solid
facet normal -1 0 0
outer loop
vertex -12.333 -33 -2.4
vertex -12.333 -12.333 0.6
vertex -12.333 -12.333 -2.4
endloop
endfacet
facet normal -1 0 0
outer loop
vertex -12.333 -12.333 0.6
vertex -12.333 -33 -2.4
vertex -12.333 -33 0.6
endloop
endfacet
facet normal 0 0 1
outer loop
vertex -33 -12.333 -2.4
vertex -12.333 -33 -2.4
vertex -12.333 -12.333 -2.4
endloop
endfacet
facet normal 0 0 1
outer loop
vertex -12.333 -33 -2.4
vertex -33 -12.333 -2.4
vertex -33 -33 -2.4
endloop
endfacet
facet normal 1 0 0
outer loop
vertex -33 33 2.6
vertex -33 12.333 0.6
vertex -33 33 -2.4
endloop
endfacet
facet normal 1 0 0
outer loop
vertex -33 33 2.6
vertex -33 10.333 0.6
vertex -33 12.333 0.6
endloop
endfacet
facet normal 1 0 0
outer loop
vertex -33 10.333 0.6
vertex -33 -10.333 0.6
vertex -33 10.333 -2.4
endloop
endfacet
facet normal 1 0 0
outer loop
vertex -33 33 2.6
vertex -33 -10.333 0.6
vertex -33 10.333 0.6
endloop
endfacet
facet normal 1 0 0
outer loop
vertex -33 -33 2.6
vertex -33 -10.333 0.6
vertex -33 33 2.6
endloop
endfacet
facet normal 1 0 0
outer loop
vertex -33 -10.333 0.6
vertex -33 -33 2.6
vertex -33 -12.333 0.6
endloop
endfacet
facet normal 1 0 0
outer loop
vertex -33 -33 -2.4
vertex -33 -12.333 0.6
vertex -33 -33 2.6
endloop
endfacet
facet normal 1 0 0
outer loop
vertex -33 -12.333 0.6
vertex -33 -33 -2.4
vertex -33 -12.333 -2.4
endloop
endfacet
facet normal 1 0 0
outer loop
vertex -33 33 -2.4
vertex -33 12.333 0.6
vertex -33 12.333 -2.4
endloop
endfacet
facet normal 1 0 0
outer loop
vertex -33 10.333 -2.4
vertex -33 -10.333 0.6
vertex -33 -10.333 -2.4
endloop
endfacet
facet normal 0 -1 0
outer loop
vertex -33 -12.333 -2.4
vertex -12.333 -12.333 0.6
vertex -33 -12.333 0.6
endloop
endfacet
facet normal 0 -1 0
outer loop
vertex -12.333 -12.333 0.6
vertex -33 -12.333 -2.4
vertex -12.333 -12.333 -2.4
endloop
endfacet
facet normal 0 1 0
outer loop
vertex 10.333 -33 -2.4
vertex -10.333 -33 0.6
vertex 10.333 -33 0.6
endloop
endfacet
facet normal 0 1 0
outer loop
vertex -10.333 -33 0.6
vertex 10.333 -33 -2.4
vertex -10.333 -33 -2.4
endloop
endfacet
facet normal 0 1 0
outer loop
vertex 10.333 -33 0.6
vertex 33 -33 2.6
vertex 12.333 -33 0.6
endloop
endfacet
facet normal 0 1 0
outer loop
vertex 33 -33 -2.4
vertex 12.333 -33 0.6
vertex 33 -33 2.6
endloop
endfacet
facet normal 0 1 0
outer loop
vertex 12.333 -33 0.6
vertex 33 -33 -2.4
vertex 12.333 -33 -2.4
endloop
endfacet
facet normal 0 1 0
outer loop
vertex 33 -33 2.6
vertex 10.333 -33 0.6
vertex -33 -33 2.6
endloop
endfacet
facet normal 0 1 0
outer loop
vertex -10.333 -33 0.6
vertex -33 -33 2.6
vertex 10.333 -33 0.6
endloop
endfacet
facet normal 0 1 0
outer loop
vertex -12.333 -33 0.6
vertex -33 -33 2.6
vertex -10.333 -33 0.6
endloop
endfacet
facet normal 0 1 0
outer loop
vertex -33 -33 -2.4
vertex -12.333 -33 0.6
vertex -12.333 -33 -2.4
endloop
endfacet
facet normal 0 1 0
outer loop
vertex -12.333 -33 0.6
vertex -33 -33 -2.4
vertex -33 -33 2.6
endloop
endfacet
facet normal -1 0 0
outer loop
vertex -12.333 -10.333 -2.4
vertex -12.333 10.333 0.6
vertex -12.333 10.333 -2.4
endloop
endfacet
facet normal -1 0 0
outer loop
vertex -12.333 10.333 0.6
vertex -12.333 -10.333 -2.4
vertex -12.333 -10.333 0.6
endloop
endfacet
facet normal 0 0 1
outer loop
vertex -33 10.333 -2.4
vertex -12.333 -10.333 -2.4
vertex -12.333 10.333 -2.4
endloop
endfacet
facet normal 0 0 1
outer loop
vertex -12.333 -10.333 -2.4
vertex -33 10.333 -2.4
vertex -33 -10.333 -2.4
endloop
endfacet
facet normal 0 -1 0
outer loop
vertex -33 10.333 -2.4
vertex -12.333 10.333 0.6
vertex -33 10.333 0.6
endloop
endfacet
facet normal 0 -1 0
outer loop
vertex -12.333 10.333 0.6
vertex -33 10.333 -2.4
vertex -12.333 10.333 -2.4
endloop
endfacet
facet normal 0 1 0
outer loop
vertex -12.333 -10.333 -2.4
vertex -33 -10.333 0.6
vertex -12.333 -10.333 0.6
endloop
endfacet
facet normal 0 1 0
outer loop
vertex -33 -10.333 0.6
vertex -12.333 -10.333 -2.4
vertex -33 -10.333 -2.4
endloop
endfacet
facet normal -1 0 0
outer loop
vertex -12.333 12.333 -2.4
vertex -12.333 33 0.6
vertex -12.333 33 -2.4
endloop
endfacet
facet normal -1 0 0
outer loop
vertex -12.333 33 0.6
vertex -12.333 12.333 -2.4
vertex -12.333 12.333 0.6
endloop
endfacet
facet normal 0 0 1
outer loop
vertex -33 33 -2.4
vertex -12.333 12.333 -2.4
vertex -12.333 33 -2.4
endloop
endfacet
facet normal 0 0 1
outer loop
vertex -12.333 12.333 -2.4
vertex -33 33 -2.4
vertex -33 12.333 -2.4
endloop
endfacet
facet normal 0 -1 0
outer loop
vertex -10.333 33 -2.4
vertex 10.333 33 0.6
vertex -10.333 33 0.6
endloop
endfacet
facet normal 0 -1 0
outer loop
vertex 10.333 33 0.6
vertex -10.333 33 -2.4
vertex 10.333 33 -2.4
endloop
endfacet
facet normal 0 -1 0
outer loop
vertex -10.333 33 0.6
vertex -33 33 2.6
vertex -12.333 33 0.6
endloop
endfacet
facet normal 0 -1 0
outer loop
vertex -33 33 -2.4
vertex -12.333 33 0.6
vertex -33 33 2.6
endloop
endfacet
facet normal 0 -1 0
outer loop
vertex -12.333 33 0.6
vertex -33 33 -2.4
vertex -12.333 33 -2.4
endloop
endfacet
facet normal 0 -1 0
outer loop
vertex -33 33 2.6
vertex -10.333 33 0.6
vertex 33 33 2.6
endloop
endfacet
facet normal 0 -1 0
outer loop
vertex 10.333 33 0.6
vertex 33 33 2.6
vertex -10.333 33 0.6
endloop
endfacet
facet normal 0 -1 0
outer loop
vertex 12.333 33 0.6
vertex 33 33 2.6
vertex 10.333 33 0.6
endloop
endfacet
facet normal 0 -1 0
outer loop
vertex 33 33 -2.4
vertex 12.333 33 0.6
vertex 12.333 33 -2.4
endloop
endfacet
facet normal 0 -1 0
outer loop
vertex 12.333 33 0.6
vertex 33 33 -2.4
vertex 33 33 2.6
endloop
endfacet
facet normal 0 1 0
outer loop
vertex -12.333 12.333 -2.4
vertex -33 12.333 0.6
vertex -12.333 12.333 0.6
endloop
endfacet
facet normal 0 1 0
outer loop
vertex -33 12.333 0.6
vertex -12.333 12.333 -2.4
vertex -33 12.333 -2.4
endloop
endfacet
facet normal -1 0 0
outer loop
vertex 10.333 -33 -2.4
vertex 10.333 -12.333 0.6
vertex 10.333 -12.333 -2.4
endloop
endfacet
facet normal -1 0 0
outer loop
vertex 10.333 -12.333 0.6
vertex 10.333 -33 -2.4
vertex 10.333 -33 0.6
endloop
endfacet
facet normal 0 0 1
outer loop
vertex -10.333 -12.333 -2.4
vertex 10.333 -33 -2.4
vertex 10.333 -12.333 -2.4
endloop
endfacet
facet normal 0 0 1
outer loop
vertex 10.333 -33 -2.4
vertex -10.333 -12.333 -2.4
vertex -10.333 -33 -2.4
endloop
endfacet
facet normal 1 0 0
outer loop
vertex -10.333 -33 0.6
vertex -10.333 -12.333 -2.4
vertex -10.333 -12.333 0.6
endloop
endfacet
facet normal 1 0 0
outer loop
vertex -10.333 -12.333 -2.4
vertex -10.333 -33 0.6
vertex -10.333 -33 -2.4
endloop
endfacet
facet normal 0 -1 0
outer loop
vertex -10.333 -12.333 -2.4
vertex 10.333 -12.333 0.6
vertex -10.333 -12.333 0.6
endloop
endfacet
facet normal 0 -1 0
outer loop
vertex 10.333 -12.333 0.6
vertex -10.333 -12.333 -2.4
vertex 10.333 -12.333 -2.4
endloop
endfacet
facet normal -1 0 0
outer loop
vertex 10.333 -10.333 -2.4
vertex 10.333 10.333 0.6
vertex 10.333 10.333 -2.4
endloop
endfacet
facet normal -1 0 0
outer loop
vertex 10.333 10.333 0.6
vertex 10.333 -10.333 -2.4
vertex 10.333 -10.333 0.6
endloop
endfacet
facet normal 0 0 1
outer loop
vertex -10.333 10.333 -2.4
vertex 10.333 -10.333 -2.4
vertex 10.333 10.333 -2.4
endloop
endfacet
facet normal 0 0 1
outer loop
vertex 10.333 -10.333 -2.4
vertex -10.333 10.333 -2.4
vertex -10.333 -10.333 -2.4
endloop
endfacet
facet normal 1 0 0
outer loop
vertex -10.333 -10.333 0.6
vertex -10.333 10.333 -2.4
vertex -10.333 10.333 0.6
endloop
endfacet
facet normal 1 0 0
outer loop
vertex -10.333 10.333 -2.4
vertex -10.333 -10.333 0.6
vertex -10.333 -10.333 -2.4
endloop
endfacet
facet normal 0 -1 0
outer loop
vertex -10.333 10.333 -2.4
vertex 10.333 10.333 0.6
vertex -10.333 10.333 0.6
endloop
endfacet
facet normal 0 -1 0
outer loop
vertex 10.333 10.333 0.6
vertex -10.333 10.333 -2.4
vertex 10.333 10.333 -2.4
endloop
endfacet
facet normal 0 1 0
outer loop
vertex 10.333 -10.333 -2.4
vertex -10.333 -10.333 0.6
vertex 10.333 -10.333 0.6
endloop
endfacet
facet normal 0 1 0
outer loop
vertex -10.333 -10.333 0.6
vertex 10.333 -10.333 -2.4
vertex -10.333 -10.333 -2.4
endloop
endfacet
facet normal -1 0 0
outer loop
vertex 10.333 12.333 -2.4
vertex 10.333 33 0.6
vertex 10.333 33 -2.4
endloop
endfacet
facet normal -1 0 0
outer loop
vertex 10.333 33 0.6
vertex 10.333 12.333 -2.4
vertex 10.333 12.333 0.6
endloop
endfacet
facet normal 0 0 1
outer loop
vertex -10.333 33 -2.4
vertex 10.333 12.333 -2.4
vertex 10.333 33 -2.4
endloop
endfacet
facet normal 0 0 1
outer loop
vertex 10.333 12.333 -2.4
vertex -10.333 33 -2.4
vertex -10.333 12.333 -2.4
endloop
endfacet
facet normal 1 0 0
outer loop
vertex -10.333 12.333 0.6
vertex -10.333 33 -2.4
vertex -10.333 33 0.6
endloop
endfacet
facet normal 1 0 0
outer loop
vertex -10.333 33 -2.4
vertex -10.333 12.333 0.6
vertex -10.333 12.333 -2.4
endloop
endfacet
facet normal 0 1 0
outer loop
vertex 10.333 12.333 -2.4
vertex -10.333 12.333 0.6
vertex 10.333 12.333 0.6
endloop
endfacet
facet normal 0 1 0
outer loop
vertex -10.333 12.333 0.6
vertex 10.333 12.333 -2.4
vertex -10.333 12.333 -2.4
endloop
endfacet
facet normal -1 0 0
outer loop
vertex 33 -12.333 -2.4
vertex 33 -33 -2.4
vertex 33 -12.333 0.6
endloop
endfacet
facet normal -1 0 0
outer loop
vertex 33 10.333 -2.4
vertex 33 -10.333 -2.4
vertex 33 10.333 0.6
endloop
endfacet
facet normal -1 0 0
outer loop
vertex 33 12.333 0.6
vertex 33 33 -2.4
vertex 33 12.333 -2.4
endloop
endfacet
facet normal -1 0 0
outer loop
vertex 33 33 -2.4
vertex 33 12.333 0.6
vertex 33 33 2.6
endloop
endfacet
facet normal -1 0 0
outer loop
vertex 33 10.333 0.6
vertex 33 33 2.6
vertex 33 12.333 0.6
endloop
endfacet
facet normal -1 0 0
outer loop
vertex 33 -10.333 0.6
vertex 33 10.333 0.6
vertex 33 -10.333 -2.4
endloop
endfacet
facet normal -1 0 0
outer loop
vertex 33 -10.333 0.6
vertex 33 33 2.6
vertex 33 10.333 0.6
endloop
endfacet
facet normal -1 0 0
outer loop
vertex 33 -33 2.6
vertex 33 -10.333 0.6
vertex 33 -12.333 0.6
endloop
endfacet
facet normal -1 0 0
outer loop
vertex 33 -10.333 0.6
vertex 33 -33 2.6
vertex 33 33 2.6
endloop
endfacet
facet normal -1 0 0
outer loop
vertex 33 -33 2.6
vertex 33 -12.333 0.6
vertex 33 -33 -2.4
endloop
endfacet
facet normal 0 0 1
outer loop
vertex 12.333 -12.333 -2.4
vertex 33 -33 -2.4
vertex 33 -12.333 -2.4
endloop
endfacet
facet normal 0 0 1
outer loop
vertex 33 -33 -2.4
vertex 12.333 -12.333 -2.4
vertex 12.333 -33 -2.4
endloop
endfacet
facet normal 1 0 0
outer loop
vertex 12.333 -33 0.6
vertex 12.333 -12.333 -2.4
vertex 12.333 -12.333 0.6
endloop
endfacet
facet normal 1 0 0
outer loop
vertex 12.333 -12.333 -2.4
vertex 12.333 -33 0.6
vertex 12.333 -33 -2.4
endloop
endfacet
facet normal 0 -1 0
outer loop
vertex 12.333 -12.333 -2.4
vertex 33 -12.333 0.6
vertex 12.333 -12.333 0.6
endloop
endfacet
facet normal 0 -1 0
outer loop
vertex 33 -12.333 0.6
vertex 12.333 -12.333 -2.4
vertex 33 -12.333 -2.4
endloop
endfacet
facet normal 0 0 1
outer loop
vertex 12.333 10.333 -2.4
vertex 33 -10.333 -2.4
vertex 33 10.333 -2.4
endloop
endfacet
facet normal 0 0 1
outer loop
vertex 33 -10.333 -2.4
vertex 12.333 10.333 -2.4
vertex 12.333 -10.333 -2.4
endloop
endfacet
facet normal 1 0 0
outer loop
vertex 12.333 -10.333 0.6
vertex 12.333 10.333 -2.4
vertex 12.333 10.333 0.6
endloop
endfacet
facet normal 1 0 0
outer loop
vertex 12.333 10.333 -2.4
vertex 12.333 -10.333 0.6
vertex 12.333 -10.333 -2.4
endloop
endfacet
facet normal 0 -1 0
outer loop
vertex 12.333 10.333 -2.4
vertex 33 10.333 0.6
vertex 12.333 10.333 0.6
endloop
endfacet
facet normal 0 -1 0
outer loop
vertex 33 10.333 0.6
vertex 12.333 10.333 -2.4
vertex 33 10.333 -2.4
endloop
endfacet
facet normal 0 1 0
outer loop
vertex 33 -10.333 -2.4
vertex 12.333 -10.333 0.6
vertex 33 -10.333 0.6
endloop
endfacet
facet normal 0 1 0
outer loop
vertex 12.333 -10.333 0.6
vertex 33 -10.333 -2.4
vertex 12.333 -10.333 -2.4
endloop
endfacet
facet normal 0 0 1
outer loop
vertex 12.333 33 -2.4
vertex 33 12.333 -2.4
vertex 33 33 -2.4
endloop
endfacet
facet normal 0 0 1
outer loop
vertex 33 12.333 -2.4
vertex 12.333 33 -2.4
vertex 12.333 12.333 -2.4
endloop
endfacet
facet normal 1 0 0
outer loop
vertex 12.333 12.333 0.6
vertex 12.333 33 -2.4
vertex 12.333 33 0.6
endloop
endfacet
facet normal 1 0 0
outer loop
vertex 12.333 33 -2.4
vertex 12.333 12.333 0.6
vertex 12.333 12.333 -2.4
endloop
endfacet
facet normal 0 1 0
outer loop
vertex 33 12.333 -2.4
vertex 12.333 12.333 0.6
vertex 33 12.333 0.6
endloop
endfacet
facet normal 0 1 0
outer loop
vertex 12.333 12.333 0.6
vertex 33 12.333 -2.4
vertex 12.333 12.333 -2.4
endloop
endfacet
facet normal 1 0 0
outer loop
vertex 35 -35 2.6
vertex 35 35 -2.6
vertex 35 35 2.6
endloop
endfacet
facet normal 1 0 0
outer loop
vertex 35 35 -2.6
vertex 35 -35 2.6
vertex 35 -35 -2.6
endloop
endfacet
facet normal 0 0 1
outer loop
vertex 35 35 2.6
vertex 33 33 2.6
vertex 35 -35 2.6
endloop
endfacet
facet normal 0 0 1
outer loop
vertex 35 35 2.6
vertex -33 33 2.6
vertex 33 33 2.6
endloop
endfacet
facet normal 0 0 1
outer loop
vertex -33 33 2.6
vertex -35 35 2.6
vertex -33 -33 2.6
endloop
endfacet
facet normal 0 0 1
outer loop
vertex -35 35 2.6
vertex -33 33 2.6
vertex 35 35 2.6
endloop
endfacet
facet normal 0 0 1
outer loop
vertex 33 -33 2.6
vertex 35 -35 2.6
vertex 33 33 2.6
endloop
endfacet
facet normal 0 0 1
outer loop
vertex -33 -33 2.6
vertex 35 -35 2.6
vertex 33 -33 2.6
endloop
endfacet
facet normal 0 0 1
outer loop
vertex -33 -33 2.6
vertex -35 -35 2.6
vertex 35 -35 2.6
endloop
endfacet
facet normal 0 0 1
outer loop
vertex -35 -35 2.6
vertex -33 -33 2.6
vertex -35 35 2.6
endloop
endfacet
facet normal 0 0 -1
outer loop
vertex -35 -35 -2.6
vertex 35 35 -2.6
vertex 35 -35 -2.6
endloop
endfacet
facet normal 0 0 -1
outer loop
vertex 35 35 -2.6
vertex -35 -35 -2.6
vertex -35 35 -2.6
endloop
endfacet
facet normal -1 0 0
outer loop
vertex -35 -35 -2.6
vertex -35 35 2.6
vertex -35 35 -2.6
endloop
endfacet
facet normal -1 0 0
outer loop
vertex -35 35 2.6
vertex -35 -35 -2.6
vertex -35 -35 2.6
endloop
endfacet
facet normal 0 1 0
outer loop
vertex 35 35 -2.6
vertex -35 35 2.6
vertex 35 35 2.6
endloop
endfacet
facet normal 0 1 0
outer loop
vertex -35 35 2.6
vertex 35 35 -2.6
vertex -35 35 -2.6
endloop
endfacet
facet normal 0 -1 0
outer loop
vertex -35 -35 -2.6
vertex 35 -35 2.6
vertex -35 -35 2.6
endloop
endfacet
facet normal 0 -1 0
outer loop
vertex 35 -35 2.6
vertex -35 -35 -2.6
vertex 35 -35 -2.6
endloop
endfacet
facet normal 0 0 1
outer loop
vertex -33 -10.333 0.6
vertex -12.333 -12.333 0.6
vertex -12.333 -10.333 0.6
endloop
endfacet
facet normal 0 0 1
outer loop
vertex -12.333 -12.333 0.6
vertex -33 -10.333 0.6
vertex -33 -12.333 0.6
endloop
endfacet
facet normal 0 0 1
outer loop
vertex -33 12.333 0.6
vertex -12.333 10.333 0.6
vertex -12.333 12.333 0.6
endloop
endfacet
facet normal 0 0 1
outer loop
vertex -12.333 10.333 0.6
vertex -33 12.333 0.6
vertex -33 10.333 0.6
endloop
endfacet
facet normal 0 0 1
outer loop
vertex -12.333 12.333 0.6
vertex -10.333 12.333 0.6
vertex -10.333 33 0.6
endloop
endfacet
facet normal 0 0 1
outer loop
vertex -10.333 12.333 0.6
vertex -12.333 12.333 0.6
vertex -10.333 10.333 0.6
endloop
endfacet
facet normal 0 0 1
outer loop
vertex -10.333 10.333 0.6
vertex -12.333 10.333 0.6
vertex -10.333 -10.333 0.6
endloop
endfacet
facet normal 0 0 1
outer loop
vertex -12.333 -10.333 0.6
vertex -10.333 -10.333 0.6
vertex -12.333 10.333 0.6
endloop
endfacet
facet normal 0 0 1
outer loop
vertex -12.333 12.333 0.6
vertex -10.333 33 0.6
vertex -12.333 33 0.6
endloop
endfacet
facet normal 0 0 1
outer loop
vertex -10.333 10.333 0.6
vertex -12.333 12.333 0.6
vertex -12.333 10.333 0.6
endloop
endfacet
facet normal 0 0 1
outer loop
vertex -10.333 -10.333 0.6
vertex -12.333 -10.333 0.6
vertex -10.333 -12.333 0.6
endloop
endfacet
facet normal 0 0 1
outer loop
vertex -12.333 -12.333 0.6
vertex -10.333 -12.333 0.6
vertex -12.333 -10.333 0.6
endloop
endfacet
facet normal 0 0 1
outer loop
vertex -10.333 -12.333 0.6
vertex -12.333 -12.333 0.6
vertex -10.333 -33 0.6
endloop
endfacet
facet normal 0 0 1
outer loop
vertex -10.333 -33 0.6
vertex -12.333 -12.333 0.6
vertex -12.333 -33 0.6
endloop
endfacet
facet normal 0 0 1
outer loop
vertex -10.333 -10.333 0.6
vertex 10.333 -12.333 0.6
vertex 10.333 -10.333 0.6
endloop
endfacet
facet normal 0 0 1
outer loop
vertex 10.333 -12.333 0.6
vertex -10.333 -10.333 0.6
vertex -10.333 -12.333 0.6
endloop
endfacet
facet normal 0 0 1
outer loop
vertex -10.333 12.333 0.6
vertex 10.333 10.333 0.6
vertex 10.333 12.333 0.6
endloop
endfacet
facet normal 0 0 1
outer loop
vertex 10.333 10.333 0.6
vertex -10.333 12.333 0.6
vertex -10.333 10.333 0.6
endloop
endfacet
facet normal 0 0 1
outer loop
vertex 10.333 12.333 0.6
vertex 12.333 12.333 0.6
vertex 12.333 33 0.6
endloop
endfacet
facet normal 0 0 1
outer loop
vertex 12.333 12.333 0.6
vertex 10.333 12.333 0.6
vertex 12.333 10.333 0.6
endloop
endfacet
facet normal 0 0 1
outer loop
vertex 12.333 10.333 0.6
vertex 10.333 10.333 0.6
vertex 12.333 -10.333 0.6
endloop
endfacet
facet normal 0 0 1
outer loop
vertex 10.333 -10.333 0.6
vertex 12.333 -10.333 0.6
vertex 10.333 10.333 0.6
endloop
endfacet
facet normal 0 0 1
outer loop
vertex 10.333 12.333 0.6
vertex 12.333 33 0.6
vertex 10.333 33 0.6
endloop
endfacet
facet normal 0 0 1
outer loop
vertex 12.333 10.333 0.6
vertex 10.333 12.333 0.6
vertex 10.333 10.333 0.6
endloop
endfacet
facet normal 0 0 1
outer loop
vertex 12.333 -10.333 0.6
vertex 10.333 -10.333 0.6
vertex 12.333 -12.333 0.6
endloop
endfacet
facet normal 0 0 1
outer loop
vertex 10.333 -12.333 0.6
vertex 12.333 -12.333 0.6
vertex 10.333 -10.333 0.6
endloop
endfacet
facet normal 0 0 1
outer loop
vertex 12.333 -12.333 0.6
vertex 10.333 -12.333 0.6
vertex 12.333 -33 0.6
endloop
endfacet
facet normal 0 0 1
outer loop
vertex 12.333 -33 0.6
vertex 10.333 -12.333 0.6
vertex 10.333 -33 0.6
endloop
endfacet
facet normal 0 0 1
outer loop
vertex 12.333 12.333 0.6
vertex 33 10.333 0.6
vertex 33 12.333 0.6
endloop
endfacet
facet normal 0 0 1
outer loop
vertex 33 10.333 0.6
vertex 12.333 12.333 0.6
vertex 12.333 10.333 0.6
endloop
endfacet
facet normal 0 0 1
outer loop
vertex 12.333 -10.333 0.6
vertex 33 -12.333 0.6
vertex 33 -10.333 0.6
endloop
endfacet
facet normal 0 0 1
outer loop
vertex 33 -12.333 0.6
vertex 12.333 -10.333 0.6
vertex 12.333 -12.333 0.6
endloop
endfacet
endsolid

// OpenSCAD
DimX=70;
DimY=70;
DimZ=5.2;

BigH=2;
BigW=66;
SmallH=3;
BorderW=2;

module tictactoeBase()
{
	difference() {
		cube([DimX,DimY,DimZ], center = true);
		translate([0,0,(DimZ/2)-(BigH/2)])	
		{	
			cube([BigW,BigW,BigH], center = true);	
		}
		union() {			
			for(i=[-1,0,1])		
			{
				for(j=[-1,0,1])		
				{
					translate([(i*(BigW-(2*BorderW))/3)+i*BorderW,(j*(BigW-(2*BorderW))/3)+j*BorderW,(DimZ/2)-((SmallH+BigH)/2)])	
					{	
						cube([(BigW-(2*BorderW))/3, (BigW-(2*BorderW))/3, SmallH+BigH], center = true);	
					}
				}
			}
		}
	}
}

tictactoeBase();
